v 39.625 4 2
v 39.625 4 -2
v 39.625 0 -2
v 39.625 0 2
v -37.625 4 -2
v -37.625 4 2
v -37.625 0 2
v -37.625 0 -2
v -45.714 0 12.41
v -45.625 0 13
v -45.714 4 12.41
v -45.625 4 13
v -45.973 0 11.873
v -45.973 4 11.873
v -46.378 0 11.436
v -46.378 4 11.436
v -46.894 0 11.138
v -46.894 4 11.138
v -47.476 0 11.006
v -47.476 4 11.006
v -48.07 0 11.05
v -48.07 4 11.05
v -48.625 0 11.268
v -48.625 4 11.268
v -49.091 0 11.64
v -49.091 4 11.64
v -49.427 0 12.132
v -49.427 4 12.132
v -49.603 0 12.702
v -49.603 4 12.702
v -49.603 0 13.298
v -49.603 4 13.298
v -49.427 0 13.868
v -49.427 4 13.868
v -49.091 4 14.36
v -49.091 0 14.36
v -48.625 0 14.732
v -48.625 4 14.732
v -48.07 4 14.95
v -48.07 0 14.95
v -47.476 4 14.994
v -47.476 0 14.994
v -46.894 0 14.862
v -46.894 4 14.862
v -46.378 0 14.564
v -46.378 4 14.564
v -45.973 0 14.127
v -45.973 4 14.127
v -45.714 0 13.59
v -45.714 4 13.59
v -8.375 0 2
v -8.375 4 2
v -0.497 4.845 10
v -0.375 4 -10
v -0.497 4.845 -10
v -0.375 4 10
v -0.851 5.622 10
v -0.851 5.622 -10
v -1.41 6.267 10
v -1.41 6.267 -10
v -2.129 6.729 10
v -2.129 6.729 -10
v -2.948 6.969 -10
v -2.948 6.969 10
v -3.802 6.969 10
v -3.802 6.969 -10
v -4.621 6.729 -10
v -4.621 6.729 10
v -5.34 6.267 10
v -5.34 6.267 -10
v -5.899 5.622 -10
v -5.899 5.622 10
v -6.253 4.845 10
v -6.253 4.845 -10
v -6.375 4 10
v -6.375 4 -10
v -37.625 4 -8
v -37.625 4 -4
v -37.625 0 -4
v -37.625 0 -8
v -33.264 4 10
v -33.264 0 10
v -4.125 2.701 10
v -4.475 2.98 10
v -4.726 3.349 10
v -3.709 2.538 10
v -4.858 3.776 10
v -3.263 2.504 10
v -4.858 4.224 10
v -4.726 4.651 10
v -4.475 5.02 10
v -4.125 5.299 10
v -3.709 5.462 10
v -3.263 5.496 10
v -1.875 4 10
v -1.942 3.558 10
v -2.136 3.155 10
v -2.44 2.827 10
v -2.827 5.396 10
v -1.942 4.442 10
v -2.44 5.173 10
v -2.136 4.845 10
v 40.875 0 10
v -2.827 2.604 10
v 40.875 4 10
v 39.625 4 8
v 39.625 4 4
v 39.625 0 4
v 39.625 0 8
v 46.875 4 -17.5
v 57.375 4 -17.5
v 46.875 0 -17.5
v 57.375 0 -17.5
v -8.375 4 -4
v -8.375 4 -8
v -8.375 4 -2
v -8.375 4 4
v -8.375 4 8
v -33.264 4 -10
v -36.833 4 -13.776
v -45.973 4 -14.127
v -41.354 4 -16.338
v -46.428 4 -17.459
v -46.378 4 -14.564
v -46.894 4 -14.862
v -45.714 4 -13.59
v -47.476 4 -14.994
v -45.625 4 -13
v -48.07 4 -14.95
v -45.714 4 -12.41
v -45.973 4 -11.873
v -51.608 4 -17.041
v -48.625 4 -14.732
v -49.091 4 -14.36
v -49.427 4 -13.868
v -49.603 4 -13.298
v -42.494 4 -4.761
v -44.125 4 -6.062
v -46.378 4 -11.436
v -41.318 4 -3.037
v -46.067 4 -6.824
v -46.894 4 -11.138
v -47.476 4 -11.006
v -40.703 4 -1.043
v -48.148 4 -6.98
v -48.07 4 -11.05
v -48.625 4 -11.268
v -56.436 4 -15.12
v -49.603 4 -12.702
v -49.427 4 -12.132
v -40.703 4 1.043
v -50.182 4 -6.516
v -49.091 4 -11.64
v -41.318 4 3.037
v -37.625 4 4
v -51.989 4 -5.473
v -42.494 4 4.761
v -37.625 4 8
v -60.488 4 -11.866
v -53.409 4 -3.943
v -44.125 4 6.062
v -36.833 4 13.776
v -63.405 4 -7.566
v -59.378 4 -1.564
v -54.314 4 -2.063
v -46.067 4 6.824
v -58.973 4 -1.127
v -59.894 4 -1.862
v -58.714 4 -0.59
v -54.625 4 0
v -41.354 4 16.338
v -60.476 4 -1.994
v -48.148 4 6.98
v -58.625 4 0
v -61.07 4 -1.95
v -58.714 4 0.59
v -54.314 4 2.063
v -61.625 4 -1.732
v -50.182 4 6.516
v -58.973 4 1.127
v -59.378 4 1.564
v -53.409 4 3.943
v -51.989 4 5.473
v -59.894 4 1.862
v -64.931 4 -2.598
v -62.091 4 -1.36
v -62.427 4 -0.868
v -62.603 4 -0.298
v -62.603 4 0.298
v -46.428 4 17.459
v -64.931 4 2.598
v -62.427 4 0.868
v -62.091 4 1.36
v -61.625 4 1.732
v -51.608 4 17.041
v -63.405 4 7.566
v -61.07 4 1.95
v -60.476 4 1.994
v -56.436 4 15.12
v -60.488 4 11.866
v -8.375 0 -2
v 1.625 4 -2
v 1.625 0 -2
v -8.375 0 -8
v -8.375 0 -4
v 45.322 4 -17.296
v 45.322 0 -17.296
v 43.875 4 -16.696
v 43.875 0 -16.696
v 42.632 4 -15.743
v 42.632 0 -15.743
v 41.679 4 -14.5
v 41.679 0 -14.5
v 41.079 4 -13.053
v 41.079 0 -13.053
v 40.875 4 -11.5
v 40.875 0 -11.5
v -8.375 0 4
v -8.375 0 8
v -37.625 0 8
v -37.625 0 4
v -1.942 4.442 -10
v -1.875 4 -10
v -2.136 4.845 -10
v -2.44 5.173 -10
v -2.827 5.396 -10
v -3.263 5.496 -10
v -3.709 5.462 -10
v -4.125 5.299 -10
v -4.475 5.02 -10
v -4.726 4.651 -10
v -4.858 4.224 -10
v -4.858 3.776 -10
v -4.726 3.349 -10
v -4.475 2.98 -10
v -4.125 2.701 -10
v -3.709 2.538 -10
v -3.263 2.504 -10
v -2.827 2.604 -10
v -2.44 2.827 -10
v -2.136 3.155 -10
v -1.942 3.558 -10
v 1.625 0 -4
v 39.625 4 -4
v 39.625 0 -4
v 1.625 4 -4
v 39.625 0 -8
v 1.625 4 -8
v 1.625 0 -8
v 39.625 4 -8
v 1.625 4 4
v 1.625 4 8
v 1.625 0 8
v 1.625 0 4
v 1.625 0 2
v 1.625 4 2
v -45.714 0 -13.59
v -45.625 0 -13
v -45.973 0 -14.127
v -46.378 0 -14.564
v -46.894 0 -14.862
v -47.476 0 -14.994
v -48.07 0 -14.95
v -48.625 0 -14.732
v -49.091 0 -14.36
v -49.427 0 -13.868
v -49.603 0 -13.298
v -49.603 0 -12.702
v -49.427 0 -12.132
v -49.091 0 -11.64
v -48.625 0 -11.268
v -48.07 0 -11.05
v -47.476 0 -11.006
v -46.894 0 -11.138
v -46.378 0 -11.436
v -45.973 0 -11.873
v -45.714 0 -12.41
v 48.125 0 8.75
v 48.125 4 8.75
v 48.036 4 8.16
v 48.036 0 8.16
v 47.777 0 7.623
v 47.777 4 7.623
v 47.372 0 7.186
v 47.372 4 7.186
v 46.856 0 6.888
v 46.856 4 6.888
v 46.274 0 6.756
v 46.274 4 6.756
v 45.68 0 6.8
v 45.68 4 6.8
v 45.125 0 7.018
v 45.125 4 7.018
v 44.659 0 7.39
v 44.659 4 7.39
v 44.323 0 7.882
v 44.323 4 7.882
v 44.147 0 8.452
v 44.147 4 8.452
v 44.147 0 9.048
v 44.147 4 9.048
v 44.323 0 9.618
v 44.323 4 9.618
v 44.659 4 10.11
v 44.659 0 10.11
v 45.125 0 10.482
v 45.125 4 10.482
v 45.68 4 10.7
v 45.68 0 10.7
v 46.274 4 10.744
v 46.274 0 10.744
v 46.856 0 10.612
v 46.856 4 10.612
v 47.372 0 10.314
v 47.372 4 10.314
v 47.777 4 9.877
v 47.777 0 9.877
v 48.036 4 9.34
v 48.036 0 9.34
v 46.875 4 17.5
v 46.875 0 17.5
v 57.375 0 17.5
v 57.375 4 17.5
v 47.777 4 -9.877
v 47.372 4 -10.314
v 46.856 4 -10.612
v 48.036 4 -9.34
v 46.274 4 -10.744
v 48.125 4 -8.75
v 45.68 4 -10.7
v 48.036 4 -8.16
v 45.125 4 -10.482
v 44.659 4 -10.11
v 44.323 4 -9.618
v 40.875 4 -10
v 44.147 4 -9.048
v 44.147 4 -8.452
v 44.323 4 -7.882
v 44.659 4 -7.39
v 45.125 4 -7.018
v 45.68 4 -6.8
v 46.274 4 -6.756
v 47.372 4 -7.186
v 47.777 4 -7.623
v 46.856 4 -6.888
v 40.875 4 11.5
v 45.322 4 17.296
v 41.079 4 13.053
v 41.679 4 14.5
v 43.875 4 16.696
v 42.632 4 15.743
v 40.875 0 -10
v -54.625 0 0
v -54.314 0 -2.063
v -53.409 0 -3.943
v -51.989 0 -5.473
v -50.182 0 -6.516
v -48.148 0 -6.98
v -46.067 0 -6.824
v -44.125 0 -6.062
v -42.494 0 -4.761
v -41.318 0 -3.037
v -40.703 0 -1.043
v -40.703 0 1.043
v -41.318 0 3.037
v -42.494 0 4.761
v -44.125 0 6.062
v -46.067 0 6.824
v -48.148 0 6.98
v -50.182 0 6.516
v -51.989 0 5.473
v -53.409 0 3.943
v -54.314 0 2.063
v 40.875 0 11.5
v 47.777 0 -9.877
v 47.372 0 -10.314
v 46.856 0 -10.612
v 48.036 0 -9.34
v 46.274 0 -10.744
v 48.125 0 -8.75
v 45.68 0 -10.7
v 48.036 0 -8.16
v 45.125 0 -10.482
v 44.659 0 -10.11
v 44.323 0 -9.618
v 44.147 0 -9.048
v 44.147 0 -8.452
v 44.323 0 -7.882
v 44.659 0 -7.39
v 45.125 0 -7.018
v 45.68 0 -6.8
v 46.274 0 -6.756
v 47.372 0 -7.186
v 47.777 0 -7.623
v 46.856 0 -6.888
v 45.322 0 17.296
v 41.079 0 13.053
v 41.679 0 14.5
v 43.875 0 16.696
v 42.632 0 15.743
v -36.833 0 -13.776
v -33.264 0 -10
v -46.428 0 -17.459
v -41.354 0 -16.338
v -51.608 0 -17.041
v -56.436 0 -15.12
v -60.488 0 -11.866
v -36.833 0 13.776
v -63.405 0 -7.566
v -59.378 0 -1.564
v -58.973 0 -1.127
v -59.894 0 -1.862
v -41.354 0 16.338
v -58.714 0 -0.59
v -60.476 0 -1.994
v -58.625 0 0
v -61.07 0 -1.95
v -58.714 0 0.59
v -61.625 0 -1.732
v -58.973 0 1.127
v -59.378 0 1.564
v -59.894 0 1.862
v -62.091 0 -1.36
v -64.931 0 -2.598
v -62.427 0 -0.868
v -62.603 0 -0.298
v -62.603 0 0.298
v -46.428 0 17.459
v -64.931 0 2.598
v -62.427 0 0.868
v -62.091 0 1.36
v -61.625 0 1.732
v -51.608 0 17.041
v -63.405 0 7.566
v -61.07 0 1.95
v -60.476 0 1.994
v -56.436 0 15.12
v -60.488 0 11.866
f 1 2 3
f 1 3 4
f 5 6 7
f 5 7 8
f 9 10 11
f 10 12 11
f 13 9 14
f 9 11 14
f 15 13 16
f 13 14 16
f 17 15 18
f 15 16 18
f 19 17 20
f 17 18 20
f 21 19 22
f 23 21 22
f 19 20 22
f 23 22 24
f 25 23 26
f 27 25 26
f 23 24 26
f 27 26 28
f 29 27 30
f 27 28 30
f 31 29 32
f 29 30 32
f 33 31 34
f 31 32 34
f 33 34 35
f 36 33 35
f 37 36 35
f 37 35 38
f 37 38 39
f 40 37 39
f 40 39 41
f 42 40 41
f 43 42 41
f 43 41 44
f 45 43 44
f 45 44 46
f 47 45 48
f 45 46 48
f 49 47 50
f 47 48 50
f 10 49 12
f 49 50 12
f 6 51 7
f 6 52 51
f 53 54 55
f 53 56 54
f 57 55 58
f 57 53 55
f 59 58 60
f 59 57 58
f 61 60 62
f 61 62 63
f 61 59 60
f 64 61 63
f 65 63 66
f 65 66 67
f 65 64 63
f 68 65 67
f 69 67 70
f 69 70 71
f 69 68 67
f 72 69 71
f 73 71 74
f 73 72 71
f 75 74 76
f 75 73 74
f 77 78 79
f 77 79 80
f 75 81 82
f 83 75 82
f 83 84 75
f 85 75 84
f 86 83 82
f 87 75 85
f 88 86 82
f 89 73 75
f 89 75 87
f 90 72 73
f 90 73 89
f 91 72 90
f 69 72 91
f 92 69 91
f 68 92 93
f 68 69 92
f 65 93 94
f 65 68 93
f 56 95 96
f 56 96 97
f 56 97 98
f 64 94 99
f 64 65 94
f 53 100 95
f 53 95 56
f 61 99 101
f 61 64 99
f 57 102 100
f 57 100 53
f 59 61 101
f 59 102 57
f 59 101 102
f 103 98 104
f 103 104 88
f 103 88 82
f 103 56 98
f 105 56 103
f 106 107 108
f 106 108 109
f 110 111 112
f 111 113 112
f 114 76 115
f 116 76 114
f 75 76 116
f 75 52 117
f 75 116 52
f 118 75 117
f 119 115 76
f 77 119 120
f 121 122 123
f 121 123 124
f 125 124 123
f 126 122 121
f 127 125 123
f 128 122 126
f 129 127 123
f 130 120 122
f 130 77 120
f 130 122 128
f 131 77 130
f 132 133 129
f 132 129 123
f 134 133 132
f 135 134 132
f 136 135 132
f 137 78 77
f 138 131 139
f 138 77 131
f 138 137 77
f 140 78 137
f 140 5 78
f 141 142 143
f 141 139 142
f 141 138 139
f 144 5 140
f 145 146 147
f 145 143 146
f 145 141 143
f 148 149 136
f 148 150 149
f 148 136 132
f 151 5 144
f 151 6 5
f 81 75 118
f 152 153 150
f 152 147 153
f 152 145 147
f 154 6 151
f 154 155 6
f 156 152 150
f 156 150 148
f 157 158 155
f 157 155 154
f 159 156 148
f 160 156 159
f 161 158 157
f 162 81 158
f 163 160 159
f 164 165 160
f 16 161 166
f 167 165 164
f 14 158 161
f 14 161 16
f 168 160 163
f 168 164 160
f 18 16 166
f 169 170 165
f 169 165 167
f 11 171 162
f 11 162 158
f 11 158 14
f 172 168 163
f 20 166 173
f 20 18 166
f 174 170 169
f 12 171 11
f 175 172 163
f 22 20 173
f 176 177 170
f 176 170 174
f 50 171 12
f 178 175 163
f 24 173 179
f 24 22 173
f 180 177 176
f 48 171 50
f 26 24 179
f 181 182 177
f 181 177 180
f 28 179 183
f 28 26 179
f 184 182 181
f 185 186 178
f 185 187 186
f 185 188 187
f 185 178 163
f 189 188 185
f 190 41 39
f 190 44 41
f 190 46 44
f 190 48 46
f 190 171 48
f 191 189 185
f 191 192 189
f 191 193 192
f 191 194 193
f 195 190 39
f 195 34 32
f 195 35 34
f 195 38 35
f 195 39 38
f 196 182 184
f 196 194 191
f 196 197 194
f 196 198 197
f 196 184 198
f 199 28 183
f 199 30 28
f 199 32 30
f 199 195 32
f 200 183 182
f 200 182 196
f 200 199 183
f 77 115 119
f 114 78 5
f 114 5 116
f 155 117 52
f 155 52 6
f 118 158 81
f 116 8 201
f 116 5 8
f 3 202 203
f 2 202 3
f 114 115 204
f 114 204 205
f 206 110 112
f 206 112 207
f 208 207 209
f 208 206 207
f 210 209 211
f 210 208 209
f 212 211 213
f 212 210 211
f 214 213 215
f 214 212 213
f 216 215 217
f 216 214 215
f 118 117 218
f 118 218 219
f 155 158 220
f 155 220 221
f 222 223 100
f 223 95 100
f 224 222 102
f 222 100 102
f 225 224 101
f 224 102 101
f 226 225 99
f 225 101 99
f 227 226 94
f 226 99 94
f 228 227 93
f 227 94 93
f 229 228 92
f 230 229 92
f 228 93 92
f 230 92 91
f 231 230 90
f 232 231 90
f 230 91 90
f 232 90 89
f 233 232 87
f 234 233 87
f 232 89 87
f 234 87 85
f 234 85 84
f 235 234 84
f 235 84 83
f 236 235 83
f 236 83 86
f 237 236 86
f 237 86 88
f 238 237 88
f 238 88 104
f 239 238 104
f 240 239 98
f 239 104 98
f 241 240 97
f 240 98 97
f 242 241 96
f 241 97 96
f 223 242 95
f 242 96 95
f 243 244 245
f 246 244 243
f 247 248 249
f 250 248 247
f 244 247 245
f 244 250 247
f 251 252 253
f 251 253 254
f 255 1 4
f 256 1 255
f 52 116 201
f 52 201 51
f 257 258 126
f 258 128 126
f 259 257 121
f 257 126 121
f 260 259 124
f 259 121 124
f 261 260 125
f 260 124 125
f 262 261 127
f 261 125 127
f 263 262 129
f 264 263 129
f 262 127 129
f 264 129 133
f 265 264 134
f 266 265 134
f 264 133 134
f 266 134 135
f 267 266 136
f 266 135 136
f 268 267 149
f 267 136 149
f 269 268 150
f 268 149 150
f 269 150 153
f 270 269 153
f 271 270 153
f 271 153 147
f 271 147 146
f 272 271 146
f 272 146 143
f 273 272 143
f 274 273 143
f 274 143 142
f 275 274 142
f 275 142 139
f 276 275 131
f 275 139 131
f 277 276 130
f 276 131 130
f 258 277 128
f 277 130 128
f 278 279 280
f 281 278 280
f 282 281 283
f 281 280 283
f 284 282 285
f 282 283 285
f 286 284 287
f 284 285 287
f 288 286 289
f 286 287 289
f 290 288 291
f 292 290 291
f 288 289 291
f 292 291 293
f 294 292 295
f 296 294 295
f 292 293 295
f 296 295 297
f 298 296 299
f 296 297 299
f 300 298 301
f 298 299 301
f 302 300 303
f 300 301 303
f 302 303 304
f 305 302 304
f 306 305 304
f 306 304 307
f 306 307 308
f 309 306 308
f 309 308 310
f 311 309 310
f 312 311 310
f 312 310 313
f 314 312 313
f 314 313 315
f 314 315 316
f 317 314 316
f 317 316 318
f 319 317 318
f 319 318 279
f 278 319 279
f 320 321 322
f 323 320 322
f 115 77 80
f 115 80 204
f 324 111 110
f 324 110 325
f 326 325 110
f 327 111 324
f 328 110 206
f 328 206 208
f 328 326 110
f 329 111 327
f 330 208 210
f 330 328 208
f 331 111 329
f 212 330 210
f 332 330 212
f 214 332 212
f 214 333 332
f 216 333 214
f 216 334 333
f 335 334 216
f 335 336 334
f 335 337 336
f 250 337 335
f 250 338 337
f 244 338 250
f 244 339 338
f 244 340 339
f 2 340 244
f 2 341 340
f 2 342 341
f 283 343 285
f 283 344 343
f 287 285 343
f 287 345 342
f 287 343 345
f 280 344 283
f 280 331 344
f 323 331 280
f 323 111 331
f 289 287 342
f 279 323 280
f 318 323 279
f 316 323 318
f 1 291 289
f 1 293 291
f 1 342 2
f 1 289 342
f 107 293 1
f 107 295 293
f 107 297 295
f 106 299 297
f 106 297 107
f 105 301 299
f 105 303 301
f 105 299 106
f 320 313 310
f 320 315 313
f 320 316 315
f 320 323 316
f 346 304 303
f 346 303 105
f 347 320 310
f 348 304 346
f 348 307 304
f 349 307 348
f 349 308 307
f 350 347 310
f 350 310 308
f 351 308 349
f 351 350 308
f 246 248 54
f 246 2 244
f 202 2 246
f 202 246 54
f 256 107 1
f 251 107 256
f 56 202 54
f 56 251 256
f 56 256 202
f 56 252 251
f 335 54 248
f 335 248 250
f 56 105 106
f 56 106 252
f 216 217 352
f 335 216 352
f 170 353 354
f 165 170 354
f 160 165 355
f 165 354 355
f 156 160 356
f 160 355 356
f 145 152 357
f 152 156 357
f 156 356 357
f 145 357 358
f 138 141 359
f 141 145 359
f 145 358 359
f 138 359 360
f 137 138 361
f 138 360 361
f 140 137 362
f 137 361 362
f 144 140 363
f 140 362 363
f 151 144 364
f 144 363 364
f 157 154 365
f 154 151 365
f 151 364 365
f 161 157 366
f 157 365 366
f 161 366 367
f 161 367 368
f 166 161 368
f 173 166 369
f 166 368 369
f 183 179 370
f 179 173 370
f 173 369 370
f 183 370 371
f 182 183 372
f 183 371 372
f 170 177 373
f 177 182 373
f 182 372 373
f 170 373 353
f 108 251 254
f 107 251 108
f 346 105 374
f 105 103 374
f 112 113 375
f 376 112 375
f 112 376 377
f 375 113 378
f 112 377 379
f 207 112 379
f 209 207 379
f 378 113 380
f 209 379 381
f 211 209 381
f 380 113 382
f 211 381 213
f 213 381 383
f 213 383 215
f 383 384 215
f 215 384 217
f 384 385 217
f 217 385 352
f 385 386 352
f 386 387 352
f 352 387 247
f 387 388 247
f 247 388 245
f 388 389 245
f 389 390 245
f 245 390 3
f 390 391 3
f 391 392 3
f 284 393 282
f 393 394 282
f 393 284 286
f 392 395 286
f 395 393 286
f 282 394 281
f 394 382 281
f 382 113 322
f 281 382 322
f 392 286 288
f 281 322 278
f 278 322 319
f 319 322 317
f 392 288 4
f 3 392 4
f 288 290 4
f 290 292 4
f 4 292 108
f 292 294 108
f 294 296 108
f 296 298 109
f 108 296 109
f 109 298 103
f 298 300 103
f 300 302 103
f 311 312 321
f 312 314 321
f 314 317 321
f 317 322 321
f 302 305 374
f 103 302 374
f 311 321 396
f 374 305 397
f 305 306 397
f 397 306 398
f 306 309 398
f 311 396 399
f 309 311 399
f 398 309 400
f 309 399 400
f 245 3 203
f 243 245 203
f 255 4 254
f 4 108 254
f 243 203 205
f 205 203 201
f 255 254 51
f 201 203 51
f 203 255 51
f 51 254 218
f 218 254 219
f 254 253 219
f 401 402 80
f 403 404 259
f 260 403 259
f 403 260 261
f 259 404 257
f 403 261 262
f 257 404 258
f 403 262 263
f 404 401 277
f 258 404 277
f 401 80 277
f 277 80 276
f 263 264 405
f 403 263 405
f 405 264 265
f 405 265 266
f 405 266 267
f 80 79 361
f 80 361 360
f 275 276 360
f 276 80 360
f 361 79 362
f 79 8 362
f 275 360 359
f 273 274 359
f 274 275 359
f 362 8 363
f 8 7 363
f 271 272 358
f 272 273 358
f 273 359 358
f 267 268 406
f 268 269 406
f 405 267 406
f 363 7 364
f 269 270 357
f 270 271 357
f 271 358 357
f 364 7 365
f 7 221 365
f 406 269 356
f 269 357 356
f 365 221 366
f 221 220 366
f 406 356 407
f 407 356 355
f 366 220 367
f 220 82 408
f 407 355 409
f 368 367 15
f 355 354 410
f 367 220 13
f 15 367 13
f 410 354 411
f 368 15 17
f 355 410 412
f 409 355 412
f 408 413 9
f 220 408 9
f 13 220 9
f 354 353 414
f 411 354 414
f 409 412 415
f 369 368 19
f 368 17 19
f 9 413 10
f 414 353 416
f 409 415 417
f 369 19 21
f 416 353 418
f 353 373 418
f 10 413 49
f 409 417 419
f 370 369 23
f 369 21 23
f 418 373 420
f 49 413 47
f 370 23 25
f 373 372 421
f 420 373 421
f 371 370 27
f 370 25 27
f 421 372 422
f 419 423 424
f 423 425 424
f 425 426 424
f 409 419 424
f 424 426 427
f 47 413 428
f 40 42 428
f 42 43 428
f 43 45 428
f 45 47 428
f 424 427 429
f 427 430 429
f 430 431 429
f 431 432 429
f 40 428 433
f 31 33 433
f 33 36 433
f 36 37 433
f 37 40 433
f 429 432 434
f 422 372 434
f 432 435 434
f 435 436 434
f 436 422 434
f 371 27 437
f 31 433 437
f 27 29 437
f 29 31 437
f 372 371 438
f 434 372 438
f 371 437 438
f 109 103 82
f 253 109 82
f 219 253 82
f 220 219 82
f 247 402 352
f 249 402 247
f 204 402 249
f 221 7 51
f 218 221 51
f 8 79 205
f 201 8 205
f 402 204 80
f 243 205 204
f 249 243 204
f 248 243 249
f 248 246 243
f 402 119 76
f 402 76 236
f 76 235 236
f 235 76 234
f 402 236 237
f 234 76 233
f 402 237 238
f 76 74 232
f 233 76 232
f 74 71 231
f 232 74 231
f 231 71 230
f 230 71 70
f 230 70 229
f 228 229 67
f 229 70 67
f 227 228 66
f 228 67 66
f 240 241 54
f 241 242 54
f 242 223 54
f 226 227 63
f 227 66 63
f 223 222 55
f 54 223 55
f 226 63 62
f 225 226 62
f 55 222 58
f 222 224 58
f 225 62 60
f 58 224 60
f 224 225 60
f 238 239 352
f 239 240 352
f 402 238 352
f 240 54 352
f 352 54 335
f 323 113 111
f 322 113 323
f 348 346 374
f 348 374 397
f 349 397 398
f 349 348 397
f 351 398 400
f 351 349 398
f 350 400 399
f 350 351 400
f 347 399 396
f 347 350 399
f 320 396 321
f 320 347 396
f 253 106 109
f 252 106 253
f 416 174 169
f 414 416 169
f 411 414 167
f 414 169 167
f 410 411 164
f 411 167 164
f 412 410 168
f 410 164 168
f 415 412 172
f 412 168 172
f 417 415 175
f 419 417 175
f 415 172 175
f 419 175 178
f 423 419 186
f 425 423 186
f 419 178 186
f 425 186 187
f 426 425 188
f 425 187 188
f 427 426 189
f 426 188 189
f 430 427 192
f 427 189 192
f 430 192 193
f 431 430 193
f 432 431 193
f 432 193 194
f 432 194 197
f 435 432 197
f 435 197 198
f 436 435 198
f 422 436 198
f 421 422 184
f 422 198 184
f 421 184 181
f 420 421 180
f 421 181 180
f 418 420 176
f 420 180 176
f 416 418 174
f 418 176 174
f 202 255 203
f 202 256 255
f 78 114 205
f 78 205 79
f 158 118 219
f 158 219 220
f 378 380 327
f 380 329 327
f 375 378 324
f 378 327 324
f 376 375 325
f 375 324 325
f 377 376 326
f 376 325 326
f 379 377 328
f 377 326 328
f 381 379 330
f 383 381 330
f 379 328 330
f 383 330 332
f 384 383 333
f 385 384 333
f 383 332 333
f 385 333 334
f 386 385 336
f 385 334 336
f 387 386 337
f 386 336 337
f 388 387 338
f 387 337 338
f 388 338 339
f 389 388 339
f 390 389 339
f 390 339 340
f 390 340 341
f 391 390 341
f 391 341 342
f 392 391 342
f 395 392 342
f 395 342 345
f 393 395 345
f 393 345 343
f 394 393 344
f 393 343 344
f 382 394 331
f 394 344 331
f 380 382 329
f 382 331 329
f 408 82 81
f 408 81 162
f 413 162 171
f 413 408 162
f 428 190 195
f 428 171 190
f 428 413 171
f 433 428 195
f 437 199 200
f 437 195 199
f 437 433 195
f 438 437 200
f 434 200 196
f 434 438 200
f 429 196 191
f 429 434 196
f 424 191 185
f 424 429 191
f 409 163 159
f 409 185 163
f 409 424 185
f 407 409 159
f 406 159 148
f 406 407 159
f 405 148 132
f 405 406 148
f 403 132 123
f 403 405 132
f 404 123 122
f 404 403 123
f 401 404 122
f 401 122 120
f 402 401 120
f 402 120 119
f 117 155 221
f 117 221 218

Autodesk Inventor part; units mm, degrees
ref_plane "YZ Plane" through (0, 0, 0) normal (1, 0, 0) x (0, 1, 0)
ref_plane "XZ Plane" through (0, 0, 0) normal (0, 1, 0) x (-1, 0, 0)
ref_plane "XY Plane" through (0, 0, 0) normal (0, 0, 1) x (1, 0, 0)
sketch "Main Sketch" plane through (0, 0, 0) normal (0, 1, 0) x (-1, 0, 0)
  line L0 (-57.375, -12.0472) -> (-57.375, 12.0472)
  line L1 (-57.375, 12.0472) -> (47.625, -10) construction
  line L2 (47.625, 10) -> (-57.375, -12.0472) construction
  circle A0 centre (47.625, 0) radius 7
  line L3 (-40.875, 17.5) -> (-57.375, 17.5)
  line L4 (-57.375, 17.5) -> (-57.375, -17.5)
  line L5 (-57.375, -17.5) -> (-40.875, -17.5)
  line L6 (-40.875, 17.5) -> (-57.375, -17.5) construction
  line L7 (-57.375, 17.5) -> (-40.875, -17.5) construction
  line L8 (33.2636, -10) -> (-40.875, -10)
  line L9 (-40.875, -17.5) -> (-40.875, -10)
  line L10 (-40.875, 10) -> (-40.875, 17.5)
  line L11 (-40.875, 10) -> (33.2636, 10)
  arc A1 (33.2636, -10) -> (33.2636, 10) centre (47.625, 0) ccw
  point P0 (0, 0)
  point P1 (-49.125, 0)
  dimension "d3" = 14
  dimension "d13" = 16.5
  dimension "d14" = 35
  dimension "d15" = 0
  dimension "d18" = 20
  dimension "d101" = 35
extrude "Main Extrusion" add sketch "Main Sketch" along normal blind 4
sketch "Screw Holes Sketch" plane through (0, 4, 0) normal (0, 1, 0) x (1, 0, 0)
  circle A0 centre (46.125, -8.75) radius 2
  line L0 (57.375, 17.5) -> (40.875, 17.5) projected
  line L1 (40.875, -17.5) -> (57.375, -17.5) projected
  line L2 (35.2664, 0) -> (65.7891, 0)
  line L3 (51.375, -27.0398) -> (51.375, 30.2346) construction
  line L4 (57.375, -17.5) -> (57.375, 17.5) projected
  line L5 (40.875, -10) -> (40.875, -17.5) projected
  circle A1 centre (46.125, 8.75) radius 2
  line L6 (51.375, 27.0398) -> (51.375, -30.2346) construction
  point P0 (0, 0)
  dimension "d21" = 4
  dimension "d22" = 35
  dimension "d23" = 6
  dimension "d24" = 5.25
  dimension "d25" = 5.25
  dimension "d26" = 10.5
  dimension "d27" = 8.75
  dimension "d28" = 17.5
extrude "Screw Holes Cut" cut sketch "Screw Holes Sketch" against normal through all
fillet "Smoooooooooooooooooth" radius 6 2 edges at (40.875, 2, -17.5) (40.875, 2, 17.5)
sketch "Side Axel Hole Sketch" plane through (-47.625, 0, 10) normal (0, 0, 1) x (1, 0, 0)
  line L0 (88.5, 4) -> (88.5, 0) projected
  line L1 (0, 0) -> (0, 4) projected
  line L2 (44.25, -12.0383) -> (44.25, 22.7681) construction
  line L3 (14.3614, 0) -> (88.5, 0) projected
  line L4 (14.3614, 4) -> (88.5, 4) projected
  circle A0 centre (44.25, 4) radius 1.5
  point P0 (47.625, 0)
  dimension "d32" = 88.5
  dimension "d33" = 44.25
  dimension "d34" = 44.25
  dimension "d35" = 4
  dimension "d41" = 3
extrude "Side Axel Hole Cut" cut sketch "Side Axel Hole Sketch" against normal blind 20
sketch "Side Hole Extension Sketch" plane through (-47.625, 0, 10) normal (0, 0, 1) x (1, 0, 0)
  arc A0 (42.75, 4) -> (45.75, 4) centre (44.25, 4) ccw projected
  circle A1 centre (44.25, 4) radius 3
  circle A2 centre (44.25, 4) radius 1.5
  point P0 (47.625, 0)
  dimension "d44" = 6
extrude "Side Hole Extrusion" add sketch "Side Hole Extension Sketch" against normal blind 20
sketch "Body Holes Sketch" plane through (0, 4, 0) normal (0, 1, 0) x (1, 0, 0)
  line L0 (-37.625, 8) -> (-8.375, 8)
  line L1 (-8.375, 8) -> (-8.375, 4)
  line L2 (-8.375, 4) -> (-37.625, 4)
  line L3 (-37.625, 4) -> (-37.625, 8)
  line L4 (-6.375, -10) -> (-6.375, 10) projected
  circle A0 centre (-47.625, 0) radius 7 projected
  line L5 (-47.625, 7) -> (-47.625, -13.5384) construction
  line L6 (-6.375, 10) -> (-0.375, 10) projected
  line L7 (-47.625, 1) -> (-47.625, -19.5384) construction
  line L8 (-37.625, 2) -> (-8.375, 2)
  line L9 (-8.375, 2) -> (-8.375, -2)
  line L10 (-8.375, -2) -> (-37.625, -2)
  line L11 (-37.625, -2) -> (-37.625, 2)
  line L12 (-47.625, -5) -> (-47.625, -25.5384) construction
  line L13 (-37.625, -4) -> (-8.375, -4)
  line L14 (-8.375, -4) -> (-8.375, -8)
  line L15 (-8.375, -8) -> (-37.625, -8)
  line L16 (-37.625, -8) -> (-37.625, -4)
  line L17 (1.625, 8) -> (39.625, 8)
  line L18 (39.625, 8) -> (39.625, 4)
  line L19 (39.625, 4) -> (1.625, 4)
  line L20 (1.625, 4) -> (1.625, 8)
  line L21 (-0.375, 10) -> (-0.375, -10) projected
  line L22 (40.875, 10) -> (-0.375, 10) projected
  line L23 (1.625, -2) -> (1.625, 2)
  line L24 (39.625, -2) -> (1.625, -2)
  line L25 (39.625, 2) -> (39.625, -2)
  line L26 (1.625, 2) -> (39.625, 2)
  line L27 (1.625, -8) -> (1.625, -4)
  line L28 (39.625, -8) -> (1.625, -8)
  line L29 (39.625, -4) -> (39.625, -8)
  line L30 (1.625, -4) -> (39.625, -4)
  point P0 (0, 0)
  point P1 (-47.625, 10)
  dimension "d86" = 10
  dimension "d77" = 4
  dimension "d78" = 2
  dimension "d79" = 10
  dimension "d80" = 2
  dimension "d83" = 6
  dimension "d88" = 2
  dimension "d89" = 2
  dimension "d90" = 4
  dimension "d91" = 38
  dimension "d94" = 6
extrude "Swiss-ified" cut sketch "Body Holes Sketch" against normal through all contours L0 L1 L2 L3 | L8 L9 L10 L11 | L13 L14 L15 L16 | L17 L18 L19 L20 | L23 L26 L25 L24 | L27 L30 L29 L28
sketch "Center Plate Attachment Sketch" plane through (0, 4, 0) normal (0, 1, 0) x (1, 0, 0)
  arc A0 (-33.2636, 10) -> (-33.2636, -10) centre (-47.625, 0) ccw construction
  line L0 (-47.625, 23.7347) -> (-47.625, -30.1469) construction
  circle A1 centre (-47.625, 13) radius 2
  circle A2 centre (-47.625, -13) radius 2
  circle A3 centre (-60.625, 0) radius 2
  point P0 (0, 0)
  dimension "d108" = 4
  dimension "d109" = 4
  dimension "d110" = 4
  dimension "d111" = 13
  dimension "d112" = 13
  dimension "d113" = 13
extrude "Center Plate Attachment Cut" cut sketch "Center Plate Attachment Sketch" against normal through all
properties part number "Side V3"
